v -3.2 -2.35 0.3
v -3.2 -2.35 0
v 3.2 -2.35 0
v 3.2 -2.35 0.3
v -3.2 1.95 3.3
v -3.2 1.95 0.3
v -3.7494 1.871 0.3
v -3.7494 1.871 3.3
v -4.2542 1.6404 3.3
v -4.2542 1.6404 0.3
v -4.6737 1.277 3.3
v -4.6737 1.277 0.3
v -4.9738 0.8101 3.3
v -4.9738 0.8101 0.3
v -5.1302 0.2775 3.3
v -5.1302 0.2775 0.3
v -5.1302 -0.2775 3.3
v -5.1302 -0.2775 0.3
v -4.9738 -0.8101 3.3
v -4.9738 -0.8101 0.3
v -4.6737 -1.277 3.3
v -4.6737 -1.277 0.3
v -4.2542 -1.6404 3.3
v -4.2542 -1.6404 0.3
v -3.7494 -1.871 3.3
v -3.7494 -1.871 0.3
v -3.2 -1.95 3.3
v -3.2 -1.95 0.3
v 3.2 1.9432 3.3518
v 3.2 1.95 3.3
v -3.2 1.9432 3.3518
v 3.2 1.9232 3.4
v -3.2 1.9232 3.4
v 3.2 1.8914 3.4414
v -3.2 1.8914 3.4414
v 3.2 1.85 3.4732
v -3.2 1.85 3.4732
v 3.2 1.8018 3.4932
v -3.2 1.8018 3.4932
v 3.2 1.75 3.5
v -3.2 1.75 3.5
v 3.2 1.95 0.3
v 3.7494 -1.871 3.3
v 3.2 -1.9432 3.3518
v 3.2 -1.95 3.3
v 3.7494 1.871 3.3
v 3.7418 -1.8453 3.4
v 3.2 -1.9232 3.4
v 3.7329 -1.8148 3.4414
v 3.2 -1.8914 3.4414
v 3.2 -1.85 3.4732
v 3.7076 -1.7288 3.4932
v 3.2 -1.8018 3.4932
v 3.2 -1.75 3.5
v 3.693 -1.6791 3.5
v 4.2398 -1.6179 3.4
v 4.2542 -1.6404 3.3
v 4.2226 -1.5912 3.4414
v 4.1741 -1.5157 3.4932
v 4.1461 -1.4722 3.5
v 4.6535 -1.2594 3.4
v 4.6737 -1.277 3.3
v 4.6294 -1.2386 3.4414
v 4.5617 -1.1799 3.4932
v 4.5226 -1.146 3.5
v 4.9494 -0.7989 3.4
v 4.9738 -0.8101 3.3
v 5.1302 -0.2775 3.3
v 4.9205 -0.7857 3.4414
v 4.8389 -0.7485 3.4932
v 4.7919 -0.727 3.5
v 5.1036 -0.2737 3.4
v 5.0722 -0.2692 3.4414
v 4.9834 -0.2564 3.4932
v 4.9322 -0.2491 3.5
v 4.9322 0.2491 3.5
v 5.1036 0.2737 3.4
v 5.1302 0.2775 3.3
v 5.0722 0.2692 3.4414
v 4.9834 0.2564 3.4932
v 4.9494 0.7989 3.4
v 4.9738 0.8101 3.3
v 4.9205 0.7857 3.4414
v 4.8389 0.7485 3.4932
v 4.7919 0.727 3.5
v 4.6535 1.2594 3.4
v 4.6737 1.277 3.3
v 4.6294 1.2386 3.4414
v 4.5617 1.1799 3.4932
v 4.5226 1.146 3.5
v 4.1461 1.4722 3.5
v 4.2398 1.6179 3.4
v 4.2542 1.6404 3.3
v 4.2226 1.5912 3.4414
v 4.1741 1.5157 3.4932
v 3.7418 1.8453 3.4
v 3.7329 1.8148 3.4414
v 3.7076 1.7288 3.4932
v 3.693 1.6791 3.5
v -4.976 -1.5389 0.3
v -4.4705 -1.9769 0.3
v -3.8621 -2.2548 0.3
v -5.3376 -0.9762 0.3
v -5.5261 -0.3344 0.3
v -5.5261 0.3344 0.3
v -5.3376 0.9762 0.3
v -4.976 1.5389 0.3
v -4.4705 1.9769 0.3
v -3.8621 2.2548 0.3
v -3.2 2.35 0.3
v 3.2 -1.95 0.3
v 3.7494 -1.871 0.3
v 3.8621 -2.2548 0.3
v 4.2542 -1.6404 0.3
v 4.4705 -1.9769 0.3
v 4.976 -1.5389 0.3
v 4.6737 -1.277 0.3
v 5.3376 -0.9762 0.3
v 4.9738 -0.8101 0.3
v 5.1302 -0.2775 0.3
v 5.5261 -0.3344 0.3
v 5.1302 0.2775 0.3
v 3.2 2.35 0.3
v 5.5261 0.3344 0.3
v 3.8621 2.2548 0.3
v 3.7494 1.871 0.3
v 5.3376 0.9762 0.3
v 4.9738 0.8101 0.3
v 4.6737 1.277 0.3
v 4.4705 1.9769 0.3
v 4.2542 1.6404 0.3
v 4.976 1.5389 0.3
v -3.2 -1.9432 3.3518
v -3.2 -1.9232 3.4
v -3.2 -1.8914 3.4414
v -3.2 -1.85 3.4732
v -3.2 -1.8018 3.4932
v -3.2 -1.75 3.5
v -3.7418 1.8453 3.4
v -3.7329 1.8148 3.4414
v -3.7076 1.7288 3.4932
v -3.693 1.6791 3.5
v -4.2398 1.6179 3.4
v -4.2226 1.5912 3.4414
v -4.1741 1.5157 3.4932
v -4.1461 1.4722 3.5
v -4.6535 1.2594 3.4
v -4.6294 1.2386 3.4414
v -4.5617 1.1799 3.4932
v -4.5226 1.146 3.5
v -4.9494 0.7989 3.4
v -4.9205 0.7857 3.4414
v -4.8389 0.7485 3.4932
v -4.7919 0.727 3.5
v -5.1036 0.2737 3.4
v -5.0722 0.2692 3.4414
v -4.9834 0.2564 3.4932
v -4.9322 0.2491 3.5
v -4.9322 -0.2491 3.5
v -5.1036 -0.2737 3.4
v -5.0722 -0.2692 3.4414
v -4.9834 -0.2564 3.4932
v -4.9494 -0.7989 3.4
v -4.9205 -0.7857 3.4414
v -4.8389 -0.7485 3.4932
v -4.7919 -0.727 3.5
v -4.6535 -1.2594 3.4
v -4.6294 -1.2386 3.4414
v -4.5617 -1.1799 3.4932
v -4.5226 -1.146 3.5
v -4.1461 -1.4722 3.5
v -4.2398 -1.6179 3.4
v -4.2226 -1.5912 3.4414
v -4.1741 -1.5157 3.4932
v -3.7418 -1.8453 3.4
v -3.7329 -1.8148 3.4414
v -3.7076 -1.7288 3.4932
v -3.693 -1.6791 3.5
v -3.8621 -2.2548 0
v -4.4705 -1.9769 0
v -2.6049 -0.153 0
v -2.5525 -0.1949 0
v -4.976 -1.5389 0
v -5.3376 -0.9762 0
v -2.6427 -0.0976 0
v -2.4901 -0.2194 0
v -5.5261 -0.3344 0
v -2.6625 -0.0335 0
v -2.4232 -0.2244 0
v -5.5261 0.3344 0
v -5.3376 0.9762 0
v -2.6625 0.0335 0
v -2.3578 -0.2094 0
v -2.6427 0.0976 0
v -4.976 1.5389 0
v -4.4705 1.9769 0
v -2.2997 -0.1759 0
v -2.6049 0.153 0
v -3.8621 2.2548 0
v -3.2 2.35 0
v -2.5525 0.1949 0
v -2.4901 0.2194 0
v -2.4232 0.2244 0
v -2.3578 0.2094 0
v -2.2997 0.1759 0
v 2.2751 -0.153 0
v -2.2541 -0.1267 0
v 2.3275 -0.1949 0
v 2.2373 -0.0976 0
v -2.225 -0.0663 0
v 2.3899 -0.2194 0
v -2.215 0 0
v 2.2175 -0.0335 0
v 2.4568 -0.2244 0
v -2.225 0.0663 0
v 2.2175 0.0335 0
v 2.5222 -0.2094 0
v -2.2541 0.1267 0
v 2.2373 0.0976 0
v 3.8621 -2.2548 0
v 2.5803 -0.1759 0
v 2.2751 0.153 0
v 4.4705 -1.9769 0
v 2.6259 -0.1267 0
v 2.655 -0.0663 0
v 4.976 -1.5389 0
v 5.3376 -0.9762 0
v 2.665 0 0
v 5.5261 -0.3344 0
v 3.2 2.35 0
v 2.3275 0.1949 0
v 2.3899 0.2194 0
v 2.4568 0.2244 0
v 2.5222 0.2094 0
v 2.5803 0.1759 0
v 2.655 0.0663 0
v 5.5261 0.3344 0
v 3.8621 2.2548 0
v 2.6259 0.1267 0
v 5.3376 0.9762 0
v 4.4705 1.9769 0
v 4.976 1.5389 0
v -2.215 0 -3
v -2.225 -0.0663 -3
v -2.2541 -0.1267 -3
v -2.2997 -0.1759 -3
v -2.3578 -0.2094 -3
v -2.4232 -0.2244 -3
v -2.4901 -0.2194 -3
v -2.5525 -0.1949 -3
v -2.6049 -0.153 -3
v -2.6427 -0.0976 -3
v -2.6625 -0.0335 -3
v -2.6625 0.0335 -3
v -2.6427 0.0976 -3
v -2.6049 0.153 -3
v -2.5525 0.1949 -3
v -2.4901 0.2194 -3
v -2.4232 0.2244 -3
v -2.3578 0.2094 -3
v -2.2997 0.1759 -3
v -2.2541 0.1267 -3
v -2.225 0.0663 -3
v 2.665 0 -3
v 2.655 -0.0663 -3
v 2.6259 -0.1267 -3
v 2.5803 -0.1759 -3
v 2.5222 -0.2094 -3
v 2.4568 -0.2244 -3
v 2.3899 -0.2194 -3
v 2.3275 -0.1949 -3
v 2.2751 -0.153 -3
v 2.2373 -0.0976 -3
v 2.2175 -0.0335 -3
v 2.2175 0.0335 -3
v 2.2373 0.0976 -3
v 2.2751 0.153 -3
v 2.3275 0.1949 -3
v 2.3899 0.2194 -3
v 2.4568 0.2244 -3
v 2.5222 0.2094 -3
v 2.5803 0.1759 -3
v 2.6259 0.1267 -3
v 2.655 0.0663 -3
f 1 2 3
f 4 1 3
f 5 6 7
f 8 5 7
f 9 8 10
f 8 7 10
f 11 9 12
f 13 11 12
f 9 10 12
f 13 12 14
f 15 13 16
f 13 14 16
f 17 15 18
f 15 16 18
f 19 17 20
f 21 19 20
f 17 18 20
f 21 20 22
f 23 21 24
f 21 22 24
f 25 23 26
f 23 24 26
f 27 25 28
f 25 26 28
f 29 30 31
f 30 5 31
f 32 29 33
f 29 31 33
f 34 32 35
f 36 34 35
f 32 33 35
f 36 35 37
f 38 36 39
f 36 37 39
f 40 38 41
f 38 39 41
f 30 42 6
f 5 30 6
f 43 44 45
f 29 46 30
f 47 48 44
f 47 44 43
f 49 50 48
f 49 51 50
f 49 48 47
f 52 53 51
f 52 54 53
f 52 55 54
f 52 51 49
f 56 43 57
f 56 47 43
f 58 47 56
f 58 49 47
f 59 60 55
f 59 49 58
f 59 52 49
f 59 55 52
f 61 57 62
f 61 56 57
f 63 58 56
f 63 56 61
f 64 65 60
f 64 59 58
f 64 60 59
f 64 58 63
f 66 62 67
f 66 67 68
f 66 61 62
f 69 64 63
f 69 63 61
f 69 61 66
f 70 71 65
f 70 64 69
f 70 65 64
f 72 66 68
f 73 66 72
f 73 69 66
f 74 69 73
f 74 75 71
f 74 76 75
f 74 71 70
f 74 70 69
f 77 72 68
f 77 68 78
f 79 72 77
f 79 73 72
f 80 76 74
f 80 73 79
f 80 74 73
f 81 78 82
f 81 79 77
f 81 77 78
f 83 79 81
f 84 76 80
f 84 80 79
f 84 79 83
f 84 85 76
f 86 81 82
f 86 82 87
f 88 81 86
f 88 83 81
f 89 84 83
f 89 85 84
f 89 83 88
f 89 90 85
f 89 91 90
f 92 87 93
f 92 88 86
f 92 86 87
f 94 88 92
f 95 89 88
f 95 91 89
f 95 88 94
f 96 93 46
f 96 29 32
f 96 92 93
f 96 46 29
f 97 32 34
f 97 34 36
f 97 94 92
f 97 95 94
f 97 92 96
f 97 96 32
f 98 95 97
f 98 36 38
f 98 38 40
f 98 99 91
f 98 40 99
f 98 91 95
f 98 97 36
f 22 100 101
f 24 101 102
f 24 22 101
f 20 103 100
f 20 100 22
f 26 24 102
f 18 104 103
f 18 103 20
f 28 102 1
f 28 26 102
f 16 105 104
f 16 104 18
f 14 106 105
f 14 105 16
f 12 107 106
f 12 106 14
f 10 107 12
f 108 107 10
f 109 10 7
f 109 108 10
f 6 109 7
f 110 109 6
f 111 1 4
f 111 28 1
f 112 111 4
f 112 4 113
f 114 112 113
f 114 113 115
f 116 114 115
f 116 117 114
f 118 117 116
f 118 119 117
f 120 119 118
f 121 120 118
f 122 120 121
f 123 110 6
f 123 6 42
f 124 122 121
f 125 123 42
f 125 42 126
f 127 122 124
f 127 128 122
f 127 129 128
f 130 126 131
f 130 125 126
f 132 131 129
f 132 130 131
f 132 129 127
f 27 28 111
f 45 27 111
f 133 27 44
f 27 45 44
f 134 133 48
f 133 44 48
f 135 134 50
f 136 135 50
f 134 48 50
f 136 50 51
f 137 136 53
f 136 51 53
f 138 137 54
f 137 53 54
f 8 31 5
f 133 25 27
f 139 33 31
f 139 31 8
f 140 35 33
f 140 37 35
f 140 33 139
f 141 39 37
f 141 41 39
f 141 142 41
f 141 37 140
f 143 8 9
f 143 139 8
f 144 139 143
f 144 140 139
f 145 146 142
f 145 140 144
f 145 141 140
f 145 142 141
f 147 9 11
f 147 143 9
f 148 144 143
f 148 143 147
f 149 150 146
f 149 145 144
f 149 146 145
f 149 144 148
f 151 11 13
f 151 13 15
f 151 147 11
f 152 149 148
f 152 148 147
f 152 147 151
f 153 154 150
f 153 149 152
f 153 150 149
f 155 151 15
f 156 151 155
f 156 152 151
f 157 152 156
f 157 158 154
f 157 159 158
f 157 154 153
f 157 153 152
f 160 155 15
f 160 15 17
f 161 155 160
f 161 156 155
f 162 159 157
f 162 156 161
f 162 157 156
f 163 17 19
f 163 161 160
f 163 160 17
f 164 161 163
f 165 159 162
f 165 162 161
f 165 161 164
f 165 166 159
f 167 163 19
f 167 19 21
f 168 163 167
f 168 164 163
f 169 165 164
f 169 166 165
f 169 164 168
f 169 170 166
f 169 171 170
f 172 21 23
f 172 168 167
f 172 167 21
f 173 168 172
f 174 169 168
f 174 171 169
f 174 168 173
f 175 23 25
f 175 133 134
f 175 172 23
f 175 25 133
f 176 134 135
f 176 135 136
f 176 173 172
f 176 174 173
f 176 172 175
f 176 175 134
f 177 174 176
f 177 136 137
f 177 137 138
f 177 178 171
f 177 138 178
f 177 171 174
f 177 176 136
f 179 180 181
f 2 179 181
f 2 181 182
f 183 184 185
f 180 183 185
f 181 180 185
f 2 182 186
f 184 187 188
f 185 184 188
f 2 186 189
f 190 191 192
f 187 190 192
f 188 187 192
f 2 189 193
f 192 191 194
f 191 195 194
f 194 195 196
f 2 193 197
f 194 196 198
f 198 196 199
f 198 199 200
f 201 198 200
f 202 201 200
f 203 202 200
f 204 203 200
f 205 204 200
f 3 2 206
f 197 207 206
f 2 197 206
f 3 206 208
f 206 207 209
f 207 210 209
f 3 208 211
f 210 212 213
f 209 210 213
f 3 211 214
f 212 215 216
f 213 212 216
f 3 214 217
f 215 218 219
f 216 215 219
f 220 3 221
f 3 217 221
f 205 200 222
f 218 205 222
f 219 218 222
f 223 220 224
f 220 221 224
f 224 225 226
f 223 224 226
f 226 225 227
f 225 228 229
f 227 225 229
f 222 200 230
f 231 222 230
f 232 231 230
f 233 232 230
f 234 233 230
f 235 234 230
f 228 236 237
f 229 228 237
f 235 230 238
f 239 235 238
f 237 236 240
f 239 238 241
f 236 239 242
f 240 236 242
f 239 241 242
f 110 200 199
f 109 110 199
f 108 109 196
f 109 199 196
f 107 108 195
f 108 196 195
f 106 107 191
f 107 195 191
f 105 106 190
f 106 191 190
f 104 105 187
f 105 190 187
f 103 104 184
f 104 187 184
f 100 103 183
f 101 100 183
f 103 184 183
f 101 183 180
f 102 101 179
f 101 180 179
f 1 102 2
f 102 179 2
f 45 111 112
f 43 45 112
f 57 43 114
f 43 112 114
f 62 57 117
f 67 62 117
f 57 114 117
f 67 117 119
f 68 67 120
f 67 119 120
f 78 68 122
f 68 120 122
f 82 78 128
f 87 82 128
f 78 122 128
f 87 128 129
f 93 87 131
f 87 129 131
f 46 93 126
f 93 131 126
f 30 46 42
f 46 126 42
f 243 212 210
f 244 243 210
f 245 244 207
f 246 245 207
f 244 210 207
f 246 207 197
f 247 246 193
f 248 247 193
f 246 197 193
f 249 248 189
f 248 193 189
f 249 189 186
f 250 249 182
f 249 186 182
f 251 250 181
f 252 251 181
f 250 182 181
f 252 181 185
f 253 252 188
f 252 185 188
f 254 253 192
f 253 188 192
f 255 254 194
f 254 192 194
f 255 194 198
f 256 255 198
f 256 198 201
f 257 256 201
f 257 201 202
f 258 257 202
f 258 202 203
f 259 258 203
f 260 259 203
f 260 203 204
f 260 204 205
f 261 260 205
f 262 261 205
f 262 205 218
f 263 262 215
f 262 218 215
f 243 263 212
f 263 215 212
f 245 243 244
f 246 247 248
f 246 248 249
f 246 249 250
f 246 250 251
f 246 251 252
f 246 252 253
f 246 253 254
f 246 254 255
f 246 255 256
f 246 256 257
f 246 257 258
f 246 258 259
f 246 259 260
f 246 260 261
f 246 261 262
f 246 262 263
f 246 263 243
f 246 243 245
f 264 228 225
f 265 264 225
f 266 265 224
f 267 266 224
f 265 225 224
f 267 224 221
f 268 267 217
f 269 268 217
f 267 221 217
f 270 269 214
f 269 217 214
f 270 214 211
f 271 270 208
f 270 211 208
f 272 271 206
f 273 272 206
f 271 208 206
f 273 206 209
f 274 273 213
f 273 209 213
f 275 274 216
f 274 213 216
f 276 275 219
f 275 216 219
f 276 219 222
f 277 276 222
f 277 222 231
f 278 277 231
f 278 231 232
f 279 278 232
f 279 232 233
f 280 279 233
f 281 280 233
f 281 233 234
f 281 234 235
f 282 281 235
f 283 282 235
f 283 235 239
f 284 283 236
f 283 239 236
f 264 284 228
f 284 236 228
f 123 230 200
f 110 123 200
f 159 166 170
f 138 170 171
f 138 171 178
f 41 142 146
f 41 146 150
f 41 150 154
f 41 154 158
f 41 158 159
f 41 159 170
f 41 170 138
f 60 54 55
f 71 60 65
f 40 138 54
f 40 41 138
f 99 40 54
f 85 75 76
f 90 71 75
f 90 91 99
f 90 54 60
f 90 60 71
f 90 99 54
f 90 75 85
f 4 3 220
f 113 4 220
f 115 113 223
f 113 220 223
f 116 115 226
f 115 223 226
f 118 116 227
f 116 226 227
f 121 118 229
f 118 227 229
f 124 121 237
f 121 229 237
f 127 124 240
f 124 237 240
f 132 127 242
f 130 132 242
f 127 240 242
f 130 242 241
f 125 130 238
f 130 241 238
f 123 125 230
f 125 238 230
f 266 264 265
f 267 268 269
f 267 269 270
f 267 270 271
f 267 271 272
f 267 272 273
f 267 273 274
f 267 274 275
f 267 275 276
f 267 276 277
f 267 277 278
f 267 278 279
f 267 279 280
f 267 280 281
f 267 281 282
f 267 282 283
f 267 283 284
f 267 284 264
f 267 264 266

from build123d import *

# Parameters (mm, degrees)
F1_DEPTH = 0.3
F3_DEPTH = 3.2
F4_R     = 0.2
F5_R     = 0.225
F6_DEPTH = 3


with BuildPart() as f1:
    # F0 (on Top) → F1 (new body)
    with BuildSketch(Plane.XY):
        with BuildLine():
            Line((3.2, 2.35), (-3.2, 2.35))
            ThreePointArc((-3.2, 2.35), (-5.55, 0), (-3.2, -2.35))
            Line((-3.2, -2.35), (3.2, -2.35))
            ThreePointArc((3.2, -2.35), (5.55, 0), (3.2, 2.35))
        make_face()
    extrude(amount=F1_DEPTH)

    # F2 (on face) → F3 (join)
    with BuildSketch(Plane.XY.offset(0.3)):
        with BuildLine():
            Line((3.2, 1.95), (-3.2, 1.95))
            ThreePointArc((-3.2, 1.95), (-5.15, 0), (-3.2, -1.95))
            Line((-3.2, -1.95), (3.2, -1.95))
            ThreePointArc((3.2, -1.95), (5.15, 0), (3.2, 1.95))
        make_face()
    extrude(amount=F3_DEPTH)

    # F4
    f4_edges = [f1.edges().sort_by_distance(p)[0] for p in [
        (0, 1.95, 3.5),
        (-5.15, 0, 3.5),
        (0, -1.95, 3.5),
        (5.15, 0, 3.5),
    ]]
    fillet(f4_edges, radius=F4_R)

    # F5 (on face) → F6 (join)
    with BuildSketch(Plane(origin=(0, 0, 0), x_dir=(1, 0, 0), z_dir=(0, 0, -1))):
        with Locations((-2.44, 0)):
            Circle(F5_R)
        with Locations((2.44, 0)):
            Circle(F5_R)
    extrude(amount=F6_DEPTH)


solid = f1.part
